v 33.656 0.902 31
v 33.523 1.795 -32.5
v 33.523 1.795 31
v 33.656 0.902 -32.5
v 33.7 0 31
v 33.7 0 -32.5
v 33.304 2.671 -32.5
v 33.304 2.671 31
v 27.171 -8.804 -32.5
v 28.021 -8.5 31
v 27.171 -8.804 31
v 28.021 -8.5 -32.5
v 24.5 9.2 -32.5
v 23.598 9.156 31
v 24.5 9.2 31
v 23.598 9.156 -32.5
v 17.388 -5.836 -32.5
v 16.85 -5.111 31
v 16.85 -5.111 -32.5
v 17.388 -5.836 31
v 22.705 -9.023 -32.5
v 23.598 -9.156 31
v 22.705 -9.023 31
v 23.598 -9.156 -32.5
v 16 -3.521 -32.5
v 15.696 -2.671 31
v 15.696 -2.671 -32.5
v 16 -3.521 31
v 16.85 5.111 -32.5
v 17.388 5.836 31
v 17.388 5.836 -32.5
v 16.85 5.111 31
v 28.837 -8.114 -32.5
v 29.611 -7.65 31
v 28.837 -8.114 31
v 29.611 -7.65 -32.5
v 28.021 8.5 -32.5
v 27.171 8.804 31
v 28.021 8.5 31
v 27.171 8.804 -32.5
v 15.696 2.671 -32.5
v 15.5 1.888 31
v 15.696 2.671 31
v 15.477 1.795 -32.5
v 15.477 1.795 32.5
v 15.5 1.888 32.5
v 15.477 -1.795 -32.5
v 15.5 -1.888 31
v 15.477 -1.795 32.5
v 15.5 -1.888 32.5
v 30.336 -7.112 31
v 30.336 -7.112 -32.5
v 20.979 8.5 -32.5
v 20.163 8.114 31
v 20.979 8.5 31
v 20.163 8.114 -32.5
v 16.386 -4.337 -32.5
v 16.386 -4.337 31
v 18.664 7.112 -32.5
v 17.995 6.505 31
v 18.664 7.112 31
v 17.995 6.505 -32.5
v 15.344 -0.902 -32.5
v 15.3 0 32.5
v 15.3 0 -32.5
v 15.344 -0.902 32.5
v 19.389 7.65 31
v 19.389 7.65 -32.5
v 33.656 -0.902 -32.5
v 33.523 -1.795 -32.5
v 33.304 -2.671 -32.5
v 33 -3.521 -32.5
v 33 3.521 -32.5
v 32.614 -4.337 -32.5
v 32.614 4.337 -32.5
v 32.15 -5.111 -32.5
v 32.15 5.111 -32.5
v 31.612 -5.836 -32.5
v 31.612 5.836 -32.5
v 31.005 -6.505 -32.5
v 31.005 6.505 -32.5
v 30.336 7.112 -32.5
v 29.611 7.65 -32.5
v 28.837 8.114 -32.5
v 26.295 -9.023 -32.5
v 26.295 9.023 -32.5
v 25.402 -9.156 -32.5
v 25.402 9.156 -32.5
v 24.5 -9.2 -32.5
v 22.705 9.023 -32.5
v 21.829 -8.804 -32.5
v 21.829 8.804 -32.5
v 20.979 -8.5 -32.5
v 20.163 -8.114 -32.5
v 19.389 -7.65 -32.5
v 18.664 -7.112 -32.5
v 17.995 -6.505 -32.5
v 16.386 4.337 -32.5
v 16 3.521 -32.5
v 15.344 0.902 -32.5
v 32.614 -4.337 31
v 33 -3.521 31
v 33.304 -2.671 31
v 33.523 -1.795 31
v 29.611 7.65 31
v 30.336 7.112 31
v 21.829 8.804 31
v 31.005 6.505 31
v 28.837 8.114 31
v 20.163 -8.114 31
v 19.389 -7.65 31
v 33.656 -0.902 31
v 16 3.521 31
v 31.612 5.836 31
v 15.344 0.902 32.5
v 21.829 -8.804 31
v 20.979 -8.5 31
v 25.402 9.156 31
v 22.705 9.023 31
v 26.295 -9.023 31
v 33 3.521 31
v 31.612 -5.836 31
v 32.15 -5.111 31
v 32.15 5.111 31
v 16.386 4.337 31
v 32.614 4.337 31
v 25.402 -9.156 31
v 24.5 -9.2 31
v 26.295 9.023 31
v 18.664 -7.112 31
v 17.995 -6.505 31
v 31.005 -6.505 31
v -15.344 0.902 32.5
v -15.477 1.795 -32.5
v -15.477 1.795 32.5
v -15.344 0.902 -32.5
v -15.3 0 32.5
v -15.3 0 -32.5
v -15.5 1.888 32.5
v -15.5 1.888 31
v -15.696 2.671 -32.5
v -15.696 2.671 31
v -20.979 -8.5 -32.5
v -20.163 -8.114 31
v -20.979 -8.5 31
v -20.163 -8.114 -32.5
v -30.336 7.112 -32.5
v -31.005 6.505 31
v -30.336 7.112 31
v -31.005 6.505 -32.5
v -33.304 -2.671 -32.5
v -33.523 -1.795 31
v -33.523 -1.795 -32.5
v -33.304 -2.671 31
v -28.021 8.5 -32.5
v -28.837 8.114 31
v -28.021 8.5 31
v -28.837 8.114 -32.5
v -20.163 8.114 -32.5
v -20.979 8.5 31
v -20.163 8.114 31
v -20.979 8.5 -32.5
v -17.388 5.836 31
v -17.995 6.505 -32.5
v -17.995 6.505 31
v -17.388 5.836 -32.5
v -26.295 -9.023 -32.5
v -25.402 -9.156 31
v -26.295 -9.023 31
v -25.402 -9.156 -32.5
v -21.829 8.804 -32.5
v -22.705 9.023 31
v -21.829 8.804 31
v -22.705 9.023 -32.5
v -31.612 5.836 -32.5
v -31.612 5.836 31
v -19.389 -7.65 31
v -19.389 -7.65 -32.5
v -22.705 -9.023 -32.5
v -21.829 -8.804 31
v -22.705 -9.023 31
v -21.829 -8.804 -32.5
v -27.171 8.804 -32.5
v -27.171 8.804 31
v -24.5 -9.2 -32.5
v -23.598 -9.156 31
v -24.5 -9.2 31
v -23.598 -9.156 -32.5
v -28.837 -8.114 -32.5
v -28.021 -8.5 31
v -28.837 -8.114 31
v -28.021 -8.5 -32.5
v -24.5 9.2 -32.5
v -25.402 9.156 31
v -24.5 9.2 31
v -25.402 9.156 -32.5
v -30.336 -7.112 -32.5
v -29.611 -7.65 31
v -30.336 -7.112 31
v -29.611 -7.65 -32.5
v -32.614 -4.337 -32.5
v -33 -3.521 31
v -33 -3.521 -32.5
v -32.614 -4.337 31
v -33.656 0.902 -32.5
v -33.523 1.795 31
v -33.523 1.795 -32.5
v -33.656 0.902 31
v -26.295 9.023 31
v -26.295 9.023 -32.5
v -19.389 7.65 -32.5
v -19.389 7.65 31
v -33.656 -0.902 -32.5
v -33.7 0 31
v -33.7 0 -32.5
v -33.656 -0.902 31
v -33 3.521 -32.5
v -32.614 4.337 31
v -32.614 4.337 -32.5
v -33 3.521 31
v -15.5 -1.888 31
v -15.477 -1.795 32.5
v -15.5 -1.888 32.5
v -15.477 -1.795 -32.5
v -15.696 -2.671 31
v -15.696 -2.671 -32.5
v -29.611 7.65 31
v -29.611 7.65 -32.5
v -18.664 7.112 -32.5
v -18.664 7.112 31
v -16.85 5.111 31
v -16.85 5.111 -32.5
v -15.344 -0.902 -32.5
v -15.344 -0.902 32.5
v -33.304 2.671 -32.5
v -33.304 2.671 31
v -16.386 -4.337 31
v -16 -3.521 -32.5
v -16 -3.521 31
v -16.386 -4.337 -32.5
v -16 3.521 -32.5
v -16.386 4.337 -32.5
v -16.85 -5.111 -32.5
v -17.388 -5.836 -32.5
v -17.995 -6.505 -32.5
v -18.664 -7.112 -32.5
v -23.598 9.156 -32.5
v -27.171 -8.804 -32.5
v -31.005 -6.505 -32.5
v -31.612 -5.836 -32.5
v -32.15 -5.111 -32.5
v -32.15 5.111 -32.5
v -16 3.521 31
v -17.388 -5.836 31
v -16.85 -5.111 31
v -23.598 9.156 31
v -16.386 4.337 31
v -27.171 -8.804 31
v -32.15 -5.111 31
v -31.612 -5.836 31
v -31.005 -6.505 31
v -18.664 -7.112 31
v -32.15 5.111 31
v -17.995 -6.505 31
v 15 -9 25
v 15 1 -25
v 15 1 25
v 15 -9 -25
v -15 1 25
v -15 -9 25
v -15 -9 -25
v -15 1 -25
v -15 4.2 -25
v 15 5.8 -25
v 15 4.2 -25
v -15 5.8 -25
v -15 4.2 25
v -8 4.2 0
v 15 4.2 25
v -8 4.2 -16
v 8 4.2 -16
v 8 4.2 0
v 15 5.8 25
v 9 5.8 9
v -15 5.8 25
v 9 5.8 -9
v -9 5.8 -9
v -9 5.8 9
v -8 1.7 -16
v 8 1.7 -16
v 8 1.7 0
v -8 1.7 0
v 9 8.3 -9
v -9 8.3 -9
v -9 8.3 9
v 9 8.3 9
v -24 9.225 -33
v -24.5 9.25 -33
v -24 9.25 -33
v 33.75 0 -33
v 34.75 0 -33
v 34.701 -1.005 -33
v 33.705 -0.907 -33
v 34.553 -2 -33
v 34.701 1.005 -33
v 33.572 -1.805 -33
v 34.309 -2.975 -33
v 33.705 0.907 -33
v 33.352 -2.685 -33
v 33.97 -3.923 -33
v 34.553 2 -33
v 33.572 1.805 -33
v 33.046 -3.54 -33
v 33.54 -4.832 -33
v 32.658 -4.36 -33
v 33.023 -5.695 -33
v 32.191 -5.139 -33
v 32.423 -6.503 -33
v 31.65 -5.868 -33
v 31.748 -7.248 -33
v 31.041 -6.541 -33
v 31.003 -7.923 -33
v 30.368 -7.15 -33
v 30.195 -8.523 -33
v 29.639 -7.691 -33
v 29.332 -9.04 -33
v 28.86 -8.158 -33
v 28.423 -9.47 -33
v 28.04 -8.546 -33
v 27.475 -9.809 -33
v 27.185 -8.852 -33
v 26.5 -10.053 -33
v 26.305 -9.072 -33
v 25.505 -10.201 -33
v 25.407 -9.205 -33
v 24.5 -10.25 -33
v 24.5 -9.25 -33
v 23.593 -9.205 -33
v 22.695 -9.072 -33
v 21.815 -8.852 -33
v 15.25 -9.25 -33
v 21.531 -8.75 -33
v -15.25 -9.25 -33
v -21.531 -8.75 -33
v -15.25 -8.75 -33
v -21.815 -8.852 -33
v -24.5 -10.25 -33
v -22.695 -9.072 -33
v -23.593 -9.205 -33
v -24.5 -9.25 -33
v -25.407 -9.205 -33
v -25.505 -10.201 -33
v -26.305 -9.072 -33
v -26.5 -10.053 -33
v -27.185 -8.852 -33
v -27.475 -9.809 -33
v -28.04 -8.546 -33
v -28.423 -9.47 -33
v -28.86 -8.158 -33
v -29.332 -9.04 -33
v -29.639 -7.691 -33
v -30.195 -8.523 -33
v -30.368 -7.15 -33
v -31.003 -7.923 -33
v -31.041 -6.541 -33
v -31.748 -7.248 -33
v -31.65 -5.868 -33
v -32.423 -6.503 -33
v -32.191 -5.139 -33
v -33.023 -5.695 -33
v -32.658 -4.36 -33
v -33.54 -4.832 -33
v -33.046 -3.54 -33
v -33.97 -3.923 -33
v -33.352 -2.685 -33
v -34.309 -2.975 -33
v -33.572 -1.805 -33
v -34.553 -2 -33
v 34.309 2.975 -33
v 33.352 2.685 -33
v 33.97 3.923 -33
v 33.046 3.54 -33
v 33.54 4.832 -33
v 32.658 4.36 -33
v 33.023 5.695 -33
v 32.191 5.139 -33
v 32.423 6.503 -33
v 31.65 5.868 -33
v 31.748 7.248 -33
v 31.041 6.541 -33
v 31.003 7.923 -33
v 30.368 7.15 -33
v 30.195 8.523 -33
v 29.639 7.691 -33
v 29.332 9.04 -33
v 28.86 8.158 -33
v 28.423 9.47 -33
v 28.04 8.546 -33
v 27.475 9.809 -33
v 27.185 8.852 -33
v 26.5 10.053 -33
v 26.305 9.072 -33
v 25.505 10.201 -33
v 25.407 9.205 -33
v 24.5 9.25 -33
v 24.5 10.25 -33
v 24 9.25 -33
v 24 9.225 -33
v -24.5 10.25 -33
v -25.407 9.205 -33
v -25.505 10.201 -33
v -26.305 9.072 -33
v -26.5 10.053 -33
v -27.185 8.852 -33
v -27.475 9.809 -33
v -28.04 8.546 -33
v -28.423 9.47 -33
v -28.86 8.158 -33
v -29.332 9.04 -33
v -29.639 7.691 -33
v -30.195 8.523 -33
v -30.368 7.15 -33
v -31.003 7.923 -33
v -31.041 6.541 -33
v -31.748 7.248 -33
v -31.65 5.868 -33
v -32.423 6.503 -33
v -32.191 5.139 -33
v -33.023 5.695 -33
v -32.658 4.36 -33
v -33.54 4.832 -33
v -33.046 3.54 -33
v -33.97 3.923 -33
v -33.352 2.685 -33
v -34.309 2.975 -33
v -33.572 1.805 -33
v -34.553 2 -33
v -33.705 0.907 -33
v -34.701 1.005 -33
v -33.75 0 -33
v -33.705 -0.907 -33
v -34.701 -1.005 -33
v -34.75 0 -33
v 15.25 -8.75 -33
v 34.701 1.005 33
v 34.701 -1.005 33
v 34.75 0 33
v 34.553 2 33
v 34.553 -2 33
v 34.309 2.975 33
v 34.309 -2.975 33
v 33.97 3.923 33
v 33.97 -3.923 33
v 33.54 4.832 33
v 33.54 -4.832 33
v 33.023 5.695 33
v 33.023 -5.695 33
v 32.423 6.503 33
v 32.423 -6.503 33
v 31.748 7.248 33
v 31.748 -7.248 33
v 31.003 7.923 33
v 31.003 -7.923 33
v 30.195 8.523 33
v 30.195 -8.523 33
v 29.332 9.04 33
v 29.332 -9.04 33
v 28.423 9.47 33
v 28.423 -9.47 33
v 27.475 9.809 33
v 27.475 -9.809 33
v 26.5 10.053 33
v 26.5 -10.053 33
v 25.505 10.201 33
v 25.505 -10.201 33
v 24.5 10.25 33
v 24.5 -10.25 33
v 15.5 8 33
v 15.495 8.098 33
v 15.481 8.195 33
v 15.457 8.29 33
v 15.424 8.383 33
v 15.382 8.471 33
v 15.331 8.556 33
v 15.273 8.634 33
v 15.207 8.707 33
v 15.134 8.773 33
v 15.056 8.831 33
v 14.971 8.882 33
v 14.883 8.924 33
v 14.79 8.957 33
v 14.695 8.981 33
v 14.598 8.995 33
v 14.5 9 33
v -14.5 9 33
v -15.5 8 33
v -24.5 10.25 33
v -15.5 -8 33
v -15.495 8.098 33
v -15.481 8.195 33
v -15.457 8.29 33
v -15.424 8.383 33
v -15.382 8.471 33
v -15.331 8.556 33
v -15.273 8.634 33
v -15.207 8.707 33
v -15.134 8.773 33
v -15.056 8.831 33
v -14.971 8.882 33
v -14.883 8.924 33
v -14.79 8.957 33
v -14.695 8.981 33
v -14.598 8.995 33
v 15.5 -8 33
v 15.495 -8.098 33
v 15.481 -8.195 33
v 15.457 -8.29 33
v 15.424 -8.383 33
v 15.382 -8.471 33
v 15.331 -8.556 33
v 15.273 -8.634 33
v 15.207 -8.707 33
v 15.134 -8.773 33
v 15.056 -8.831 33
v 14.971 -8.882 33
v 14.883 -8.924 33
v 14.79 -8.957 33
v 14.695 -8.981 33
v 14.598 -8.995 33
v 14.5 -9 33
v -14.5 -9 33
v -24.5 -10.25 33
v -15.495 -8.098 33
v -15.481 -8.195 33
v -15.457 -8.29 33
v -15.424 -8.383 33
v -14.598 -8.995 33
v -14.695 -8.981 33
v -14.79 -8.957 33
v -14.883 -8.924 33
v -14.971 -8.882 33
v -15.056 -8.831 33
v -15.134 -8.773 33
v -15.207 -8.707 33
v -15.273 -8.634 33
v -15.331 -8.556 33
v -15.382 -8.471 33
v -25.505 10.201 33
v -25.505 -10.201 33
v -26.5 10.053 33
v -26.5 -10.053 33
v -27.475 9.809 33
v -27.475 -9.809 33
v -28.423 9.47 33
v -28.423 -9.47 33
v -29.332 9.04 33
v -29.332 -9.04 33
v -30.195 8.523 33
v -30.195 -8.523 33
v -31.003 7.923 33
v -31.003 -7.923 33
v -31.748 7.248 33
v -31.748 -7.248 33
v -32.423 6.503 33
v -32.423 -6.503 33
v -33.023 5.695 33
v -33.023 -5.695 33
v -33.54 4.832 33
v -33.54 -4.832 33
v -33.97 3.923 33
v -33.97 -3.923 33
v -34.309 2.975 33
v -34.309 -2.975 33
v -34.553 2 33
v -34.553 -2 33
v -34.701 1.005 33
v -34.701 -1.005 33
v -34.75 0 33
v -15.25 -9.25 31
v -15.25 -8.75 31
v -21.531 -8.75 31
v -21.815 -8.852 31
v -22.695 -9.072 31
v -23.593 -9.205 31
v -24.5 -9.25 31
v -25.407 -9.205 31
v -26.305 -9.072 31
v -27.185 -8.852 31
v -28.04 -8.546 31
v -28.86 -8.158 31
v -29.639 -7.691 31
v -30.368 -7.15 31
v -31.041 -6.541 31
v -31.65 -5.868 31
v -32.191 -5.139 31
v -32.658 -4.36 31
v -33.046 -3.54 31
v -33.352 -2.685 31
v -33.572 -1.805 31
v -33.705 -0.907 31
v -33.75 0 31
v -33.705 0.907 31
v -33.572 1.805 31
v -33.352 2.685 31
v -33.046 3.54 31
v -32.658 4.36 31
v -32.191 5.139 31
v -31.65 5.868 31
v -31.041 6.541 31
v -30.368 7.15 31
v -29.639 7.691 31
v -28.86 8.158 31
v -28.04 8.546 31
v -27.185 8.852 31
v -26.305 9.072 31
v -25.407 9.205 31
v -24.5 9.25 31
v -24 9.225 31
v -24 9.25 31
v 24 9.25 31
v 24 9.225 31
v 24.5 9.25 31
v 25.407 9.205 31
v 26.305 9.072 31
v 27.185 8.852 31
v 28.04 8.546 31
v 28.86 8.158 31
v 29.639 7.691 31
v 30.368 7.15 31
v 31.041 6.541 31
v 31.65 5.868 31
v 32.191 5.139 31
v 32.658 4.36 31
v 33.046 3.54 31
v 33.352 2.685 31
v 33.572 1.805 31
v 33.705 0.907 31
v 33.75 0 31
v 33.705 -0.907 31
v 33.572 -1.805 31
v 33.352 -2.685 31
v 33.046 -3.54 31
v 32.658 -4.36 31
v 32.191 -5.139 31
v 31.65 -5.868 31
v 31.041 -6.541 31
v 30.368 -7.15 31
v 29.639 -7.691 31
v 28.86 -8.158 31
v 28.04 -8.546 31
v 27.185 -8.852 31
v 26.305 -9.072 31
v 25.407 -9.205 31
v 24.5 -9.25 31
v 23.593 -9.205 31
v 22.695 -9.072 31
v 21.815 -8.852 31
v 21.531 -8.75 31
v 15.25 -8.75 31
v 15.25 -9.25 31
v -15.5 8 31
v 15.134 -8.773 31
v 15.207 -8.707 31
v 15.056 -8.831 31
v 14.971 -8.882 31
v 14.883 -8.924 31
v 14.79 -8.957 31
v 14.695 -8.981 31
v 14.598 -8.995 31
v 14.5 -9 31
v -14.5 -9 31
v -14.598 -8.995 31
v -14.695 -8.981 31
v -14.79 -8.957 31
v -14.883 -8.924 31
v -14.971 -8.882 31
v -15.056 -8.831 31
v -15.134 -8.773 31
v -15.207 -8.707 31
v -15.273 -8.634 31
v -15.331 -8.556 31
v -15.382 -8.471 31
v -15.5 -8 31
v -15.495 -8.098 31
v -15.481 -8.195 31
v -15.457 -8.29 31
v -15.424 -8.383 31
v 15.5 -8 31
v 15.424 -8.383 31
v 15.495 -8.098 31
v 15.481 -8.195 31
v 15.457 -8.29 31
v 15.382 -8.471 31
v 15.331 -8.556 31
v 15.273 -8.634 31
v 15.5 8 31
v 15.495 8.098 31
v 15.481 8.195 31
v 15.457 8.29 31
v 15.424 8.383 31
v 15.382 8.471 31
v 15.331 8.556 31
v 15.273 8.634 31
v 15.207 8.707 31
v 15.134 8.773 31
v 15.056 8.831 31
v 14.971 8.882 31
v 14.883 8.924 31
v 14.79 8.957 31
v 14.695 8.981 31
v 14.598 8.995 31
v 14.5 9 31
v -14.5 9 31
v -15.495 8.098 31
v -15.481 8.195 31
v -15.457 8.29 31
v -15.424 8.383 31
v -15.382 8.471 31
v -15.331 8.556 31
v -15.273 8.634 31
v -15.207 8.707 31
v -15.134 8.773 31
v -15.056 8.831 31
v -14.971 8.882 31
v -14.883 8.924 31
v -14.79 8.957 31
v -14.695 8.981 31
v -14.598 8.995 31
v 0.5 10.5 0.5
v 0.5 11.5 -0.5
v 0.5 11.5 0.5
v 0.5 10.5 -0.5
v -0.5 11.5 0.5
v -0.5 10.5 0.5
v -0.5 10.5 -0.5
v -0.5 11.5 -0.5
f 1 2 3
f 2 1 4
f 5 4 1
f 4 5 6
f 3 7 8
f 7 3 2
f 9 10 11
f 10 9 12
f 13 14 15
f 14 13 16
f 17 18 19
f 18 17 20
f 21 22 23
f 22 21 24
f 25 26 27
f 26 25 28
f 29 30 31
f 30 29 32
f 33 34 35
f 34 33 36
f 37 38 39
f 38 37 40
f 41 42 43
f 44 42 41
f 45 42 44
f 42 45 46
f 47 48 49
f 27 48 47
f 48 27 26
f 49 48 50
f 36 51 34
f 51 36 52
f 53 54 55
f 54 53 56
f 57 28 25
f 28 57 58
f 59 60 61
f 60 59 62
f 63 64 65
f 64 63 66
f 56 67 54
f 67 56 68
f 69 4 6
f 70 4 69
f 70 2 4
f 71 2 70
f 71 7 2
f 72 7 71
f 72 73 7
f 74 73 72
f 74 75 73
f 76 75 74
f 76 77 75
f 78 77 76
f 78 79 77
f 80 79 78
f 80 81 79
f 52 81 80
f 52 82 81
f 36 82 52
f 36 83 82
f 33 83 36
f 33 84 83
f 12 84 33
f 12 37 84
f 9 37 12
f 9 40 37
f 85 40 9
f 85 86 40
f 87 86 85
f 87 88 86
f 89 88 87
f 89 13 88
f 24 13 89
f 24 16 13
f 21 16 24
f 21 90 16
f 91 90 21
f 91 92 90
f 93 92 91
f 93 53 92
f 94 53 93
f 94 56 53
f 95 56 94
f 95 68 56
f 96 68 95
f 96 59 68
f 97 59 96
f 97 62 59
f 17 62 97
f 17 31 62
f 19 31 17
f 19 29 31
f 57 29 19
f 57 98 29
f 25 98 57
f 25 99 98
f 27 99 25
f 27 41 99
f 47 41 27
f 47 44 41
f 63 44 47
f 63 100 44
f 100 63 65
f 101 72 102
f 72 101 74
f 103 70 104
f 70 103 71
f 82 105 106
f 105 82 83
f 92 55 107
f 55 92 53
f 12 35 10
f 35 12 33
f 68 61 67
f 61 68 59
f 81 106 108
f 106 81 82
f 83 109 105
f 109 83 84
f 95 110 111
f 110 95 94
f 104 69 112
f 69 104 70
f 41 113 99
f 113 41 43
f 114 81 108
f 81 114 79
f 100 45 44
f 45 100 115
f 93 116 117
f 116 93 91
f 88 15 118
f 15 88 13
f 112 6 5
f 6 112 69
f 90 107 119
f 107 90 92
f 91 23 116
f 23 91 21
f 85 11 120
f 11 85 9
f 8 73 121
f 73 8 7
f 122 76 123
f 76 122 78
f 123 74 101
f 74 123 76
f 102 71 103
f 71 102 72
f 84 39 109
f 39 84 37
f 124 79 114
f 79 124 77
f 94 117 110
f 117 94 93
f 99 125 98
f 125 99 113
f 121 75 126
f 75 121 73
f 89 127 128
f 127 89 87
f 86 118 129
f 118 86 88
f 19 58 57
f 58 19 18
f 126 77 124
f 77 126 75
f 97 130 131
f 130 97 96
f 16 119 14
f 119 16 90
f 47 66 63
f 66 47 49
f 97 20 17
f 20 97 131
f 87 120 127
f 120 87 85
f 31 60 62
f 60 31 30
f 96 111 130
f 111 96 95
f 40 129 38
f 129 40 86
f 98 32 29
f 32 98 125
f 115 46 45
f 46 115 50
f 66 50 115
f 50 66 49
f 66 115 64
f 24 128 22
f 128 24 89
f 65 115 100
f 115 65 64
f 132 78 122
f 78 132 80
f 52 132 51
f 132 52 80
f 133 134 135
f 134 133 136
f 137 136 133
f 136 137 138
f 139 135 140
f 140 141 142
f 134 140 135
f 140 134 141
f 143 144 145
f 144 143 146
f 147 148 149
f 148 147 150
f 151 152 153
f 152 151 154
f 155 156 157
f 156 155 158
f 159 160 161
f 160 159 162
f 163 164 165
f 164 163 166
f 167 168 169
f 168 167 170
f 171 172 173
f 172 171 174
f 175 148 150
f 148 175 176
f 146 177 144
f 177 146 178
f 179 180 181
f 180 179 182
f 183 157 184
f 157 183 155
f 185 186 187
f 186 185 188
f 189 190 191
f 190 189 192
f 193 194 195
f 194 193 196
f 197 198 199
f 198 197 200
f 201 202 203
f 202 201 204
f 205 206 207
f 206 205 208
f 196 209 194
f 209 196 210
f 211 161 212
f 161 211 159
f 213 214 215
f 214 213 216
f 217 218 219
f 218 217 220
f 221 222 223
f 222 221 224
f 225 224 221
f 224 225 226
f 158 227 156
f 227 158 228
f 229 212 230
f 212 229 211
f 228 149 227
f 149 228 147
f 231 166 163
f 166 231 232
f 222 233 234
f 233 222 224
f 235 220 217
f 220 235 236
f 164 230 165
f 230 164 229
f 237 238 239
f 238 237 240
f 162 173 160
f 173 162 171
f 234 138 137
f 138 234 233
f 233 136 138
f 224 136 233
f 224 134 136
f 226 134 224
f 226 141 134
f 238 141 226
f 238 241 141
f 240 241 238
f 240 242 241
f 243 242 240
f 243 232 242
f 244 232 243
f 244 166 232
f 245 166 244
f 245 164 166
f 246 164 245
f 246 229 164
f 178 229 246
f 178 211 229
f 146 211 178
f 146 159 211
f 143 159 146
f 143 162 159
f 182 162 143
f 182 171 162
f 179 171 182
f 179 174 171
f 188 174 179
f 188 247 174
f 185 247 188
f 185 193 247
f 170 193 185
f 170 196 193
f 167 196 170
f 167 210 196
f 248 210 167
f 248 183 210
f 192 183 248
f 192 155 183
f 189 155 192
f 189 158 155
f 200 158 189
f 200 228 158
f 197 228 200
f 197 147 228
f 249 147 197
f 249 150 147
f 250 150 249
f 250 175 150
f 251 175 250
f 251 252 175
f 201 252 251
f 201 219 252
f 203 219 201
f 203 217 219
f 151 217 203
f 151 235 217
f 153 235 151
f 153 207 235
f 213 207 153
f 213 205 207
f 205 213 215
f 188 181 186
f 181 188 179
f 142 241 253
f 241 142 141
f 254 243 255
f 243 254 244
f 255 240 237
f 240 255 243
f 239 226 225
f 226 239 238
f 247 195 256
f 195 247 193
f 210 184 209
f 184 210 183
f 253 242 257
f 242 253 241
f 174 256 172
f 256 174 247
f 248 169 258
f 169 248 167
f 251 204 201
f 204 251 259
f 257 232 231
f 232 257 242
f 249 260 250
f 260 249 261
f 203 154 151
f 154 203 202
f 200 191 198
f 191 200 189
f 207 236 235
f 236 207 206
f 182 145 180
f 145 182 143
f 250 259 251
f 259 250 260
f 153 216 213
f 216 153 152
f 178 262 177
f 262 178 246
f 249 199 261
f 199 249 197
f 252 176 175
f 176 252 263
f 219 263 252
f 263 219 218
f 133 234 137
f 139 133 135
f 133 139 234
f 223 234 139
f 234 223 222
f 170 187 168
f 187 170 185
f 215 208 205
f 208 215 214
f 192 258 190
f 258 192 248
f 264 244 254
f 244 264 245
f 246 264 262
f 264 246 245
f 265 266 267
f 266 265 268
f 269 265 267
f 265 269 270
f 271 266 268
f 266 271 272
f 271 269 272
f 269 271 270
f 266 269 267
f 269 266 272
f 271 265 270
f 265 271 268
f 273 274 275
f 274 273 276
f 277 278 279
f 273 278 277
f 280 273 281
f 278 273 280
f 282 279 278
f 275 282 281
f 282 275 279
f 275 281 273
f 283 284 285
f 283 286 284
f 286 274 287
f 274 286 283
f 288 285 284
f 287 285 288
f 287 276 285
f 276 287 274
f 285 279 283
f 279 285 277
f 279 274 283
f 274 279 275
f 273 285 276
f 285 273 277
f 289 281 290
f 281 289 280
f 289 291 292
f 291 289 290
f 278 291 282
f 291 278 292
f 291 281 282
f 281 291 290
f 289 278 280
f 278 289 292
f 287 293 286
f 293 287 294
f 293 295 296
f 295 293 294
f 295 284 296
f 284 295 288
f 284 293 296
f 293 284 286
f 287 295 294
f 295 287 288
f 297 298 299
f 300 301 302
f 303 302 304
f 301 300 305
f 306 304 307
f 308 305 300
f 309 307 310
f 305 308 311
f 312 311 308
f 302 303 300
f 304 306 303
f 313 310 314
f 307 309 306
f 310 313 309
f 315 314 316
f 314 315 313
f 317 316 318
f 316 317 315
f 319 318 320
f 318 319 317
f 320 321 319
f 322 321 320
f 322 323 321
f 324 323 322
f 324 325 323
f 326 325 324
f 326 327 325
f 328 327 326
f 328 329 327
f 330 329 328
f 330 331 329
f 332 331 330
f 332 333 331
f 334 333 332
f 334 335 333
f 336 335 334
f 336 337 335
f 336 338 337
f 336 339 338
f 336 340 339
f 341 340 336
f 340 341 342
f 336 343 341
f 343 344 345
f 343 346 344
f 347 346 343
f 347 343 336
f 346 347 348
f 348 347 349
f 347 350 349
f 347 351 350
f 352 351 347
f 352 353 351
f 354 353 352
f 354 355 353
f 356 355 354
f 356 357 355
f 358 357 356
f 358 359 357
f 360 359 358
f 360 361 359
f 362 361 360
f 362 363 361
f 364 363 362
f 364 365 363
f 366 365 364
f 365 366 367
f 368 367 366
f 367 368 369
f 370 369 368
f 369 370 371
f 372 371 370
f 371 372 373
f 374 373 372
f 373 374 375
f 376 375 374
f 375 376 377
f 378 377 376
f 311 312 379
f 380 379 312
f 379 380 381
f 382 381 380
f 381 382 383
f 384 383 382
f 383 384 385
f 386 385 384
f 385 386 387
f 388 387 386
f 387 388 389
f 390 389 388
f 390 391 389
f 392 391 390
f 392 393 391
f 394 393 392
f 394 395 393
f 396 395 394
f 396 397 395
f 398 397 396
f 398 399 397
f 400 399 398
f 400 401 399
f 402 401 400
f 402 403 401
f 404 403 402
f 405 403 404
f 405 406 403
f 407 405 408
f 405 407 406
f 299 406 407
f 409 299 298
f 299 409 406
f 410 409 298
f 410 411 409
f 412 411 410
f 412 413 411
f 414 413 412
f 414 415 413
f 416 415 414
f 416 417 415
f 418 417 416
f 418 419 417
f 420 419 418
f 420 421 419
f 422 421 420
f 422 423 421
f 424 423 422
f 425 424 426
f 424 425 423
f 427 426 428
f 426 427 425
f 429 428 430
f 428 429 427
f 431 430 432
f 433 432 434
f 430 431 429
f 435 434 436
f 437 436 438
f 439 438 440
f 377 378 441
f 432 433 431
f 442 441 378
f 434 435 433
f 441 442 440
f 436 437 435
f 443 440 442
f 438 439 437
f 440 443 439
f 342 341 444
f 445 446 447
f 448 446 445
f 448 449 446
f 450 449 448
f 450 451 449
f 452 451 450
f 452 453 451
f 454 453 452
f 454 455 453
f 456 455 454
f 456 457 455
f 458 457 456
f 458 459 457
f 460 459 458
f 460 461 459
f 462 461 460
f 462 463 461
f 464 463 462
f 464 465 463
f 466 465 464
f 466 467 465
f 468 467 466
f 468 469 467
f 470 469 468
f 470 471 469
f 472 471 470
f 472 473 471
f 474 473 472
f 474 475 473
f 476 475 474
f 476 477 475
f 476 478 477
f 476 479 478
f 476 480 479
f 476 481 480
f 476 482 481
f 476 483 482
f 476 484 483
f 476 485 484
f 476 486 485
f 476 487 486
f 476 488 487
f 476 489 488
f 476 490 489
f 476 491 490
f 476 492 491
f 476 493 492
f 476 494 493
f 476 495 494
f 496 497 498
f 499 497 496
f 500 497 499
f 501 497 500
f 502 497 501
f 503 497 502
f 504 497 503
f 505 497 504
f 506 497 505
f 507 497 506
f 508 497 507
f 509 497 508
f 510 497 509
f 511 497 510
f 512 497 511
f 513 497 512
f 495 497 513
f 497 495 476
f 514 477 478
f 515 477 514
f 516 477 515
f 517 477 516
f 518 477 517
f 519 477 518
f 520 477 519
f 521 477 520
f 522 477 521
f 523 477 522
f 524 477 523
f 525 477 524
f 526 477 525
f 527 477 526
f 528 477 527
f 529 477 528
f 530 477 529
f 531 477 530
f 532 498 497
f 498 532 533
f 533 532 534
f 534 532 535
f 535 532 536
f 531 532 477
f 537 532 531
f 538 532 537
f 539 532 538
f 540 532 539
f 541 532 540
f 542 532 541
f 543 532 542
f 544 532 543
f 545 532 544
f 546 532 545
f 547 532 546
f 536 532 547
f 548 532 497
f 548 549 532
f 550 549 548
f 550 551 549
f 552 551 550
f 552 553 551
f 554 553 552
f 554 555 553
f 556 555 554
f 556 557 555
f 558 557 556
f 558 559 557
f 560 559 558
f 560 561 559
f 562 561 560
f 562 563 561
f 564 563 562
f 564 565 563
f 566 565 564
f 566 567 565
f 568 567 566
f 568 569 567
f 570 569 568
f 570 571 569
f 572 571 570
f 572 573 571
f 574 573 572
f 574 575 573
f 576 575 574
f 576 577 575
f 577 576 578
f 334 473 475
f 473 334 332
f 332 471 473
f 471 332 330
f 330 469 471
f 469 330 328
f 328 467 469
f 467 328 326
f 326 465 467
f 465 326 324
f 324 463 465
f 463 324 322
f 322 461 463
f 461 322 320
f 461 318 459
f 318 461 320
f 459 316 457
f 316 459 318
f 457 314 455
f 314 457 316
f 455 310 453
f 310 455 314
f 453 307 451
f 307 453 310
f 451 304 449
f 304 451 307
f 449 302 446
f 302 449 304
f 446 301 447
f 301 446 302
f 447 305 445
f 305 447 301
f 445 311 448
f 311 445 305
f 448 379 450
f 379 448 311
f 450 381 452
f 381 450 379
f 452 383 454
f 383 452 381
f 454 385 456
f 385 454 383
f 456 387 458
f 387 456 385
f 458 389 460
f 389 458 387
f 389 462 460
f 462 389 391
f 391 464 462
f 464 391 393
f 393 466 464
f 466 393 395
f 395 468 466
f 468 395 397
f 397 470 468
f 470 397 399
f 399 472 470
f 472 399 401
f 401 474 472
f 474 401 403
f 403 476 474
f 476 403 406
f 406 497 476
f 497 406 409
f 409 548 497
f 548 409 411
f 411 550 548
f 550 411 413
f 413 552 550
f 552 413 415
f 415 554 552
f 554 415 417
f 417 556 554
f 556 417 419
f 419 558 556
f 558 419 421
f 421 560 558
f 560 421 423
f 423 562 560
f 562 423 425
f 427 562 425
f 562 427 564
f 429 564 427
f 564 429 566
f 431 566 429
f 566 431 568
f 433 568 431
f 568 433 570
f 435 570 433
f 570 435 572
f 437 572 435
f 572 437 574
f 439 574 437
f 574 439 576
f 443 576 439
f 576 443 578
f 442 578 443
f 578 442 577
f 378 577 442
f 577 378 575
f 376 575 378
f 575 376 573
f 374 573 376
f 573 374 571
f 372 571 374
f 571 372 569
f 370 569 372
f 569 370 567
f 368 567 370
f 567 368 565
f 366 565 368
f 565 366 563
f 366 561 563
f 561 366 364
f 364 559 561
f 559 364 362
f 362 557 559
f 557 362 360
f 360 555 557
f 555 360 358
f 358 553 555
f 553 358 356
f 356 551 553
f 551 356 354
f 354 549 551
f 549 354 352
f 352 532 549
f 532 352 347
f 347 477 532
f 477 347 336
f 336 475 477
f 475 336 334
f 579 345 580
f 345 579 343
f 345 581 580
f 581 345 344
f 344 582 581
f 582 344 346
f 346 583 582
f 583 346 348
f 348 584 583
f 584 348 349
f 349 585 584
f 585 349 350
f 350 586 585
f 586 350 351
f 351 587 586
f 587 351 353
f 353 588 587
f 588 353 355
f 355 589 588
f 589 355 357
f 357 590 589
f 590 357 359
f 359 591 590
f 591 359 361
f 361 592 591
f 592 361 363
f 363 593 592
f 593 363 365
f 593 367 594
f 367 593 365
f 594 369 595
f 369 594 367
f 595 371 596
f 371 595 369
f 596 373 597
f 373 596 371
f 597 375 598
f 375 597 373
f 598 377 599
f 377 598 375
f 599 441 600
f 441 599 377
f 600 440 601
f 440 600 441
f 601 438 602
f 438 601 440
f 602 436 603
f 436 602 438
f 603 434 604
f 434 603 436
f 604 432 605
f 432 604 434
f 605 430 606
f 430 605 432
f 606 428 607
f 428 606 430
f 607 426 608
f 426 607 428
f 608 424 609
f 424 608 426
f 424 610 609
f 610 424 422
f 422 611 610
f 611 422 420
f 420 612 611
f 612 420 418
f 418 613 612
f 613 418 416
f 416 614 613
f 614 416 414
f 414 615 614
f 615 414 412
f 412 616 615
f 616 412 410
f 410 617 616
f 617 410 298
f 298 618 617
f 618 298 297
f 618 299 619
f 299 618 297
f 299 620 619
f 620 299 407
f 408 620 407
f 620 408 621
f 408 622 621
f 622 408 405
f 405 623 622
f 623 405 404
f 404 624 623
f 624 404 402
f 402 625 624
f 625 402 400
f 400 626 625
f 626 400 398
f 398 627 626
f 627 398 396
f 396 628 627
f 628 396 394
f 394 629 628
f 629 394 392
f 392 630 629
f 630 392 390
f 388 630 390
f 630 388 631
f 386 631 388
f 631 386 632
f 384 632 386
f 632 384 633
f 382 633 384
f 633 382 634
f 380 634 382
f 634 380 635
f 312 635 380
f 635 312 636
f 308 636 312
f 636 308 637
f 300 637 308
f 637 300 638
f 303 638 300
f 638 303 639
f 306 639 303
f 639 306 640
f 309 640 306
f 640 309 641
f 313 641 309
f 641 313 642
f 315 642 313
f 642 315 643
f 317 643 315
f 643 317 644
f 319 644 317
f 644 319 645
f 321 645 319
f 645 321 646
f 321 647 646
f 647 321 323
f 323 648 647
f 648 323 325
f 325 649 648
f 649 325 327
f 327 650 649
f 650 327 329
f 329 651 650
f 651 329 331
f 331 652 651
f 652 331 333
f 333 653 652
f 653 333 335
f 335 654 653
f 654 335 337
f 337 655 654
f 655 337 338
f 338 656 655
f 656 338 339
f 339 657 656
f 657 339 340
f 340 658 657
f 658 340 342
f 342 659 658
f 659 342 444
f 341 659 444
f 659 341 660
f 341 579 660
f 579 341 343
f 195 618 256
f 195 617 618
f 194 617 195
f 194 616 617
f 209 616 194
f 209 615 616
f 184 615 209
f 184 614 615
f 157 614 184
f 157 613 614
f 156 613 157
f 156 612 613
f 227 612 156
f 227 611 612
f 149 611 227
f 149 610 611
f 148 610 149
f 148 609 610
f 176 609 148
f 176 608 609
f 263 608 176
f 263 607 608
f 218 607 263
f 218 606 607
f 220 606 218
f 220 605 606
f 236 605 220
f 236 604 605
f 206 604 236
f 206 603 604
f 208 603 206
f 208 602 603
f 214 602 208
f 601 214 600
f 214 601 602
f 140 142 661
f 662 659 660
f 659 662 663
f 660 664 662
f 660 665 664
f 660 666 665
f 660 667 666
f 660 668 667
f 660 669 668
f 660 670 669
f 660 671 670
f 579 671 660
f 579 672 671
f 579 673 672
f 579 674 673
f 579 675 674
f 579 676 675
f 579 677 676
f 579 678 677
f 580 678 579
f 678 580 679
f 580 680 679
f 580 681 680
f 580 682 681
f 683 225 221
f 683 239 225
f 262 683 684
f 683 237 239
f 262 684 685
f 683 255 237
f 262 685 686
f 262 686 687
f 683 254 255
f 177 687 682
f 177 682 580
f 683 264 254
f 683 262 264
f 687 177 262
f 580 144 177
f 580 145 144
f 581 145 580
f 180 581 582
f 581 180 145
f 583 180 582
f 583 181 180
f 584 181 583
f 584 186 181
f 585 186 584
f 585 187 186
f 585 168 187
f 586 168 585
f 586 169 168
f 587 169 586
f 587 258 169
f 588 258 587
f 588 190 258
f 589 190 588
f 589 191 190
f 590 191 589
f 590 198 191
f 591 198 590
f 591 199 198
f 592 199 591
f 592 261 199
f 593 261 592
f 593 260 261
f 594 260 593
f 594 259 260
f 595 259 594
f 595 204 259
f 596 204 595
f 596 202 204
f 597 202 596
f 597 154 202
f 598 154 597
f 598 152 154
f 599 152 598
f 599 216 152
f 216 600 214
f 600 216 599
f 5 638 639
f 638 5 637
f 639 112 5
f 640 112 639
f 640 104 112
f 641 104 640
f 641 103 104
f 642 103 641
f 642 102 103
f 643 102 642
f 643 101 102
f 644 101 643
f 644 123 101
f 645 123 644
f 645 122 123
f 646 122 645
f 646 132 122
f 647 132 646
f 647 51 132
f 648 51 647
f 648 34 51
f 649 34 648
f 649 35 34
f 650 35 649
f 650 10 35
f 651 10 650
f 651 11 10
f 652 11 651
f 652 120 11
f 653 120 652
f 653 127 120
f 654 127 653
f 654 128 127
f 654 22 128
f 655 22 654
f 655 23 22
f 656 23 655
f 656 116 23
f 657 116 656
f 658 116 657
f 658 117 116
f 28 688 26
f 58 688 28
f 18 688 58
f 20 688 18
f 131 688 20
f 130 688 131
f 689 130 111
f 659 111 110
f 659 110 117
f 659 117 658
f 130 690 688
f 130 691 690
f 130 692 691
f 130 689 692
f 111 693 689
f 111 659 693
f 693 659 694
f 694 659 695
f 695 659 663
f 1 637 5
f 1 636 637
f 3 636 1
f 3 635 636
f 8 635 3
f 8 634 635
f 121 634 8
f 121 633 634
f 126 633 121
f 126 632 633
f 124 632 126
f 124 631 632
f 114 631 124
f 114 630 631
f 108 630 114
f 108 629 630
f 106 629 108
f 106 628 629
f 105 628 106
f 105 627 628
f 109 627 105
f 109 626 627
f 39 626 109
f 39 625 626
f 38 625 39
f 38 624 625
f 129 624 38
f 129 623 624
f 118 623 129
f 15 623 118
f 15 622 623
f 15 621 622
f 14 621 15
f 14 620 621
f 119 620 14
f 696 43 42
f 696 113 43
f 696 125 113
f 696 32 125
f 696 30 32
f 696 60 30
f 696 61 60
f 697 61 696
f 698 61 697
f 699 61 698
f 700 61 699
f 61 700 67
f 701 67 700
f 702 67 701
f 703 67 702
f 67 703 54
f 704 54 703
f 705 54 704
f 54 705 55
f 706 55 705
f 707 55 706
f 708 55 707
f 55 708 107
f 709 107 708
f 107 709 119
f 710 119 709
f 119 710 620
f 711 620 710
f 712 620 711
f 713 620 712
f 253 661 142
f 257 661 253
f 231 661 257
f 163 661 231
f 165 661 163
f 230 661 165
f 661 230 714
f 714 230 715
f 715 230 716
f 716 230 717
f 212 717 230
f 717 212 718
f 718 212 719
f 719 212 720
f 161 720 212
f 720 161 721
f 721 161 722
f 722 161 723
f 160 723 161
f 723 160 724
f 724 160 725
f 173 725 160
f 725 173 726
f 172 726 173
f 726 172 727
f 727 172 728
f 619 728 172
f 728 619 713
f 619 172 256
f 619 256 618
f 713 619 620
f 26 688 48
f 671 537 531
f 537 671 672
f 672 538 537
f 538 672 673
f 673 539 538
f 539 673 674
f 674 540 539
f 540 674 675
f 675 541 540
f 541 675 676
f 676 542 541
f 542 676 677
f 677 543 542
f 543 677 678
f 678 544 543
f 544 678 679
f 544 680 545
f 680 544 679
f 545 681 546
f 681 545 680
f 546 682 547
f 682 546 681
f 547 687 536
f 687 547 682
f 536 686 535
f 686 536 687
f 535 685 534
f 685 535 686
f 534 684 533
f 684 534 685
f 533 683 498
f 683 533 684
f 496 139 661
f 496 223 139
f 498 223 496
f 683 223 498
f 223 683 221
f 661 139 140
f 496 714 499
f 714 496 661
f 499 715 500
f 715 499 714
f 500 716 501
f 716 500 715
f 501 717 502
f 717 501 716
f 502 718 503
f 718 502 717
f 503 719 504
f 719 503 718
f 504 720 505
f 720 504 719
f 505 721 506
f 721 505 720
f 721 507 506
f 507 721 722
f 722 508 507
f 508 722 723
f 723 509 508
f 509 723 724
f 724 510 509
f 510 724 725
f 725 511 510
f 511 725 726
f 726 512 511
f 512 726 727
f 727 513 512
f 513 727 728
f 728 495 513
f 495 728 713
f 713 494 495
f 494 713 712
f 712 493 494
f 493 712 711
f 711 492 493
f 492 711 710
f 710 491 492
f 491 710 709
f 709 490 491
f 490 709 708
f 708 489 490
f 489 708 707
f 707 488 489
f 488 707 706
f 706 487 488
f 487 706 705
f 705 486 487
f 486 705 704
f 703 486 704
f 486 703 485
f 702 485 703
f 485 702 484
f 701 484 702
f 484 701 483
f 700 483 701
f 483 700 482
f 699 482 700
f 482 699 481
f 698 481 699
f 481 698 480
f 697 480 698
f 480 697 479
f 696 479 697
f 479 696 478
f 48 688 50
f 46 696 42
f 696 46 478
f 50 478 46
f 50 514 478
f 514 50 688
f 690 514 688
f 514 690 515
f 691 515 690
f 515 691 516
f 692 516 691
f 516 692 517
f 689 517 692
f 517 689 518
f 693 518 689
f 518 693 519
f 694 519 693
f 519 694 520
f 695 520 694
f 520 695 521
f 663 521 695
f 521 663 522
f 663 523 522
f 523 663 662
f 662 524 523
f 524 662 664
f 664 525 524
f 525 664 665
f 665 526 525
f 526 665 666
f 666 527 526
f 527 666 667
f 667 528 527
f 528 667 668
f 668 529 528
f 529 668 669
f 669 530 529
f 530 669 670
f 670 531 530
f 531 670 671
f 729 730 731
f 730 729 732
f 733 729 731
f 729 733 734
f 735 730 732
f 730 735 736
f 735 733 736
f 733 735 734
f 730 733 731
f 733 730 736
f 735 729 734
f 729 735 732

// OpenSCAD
// file: library.scad
// Аккумулятор 18650

module akk18650() {
  cylinder(d=18.4, h=65, center=true);
  
}
// main file
include <library.scad>


// Под магнит 50х30х10 (40кг)

$fn = 64;

if(true) {

  translate([ 24.5, 0, 0]) akk18650();
  translate([-24.5, 0, 0]) akk18650();
  
  // Магниты
  /*translate([ 33, -5, 0]) cube([8,8,55], center=true);*/
  /*translate([-33, -5, 0]) cube([8,8,55], center=true);*/

  /*translate([-34, -7, 38/2+0.5]) cube([12,6,38], center=true);
  translate([-34, -7,-38/2-0.5]) cube([12,6,38], center=true);
  
  translate([ 34, -7, 38/2+0.5]) cube([12,6,38], center=true);
  translate([ 34, -7,-38/2-0.5]) cube([12,6,38], center=true);*/

  translate([0, -4, 0]) cube([30,10,50], center=true);

}


// PCB

GPS=18;

if(true) {
  translate([0,5,0]) rotate([90,90,0]){
    color("Green") 
      translate([0, 0, 0])
        cube([50,30,1.6], center=true);
      
    color("Black") {
      translate([0,-8,1.6/2]) cube([16,16,2.5]);
    }
    color("Gray") {
      translate([-GPS/2,-GPS/2,-1.6/2-2.5]) cube([GPS,GPS,2.5]);
    }
  }
}


// Корпус

L = 66;

module hand() {
  rotate([-90, 0, 0]) {
    difference() {
      cylinder(d1=6, d2=5, h=3.0);
      translate([ 0, 0, 0.1]) cylinder(d=1.5, h=33);
    }
  }
}

module shape() {
  hull() {
    translate([-24.5,0]) circle(d=18.5+2);
    translate([ 24.5,0]) circle(d=18.5+2);
    /*translate([-20,7]) circle(d=9);
    translate([ 20,7]) circle(d=9);*/
  }
}

color("red")
difference() {
  
union(){

linear_extrude(height = L, center=true) {
  union() {
    difference() {
      shape();
      
      // Под аккумуляторы
      translate([-24.5,0]) circle(d=18.5);
      translate([ 24.5,0]) circle(d=18.5);
      
      // Полость для платы и магнита.
      translate([ 0, 0.25]) square(size=[48, 18], center=true);
      
      // Формы на дне
      translate([ 0, -7]) square(size=[30.5, 4.5], center=true);
      
      // Монтажное окно
      /*translate([ 0, 10]) square(size=[36, 5], center=true);
      translate([ 19.5, 11.5]) square(size=[1,2], center=true);
      translate([-19.5, 11.5]) square(size=[1,2], center=true);*/
    }
    /*translate([-16,-9]) square(size=[6, 1], center=true);*/
    /*translate([ 13.2,-9]) square(size=[1, 2], center=true);*/
    
  }
}


// Боковые стенки
  /*translate([0, 0,-L/2-1]) linear_extrude(height = 2, center=true) difference() {
    shape();
  }*/

  translate([0, 0, L/2-1]) linear_extrude(height = 2, center=true) difference() {
    shape();
    hull() {
      translate([-31/2+1,-18/2+1]) circle(r=1);
      translate([ 31/2-1,-18/2+1]) circle(r=1);
      translate([-31/2+1, 18/2-1]) circle(r=1);
      translate([ 31/2-1, 18/2-1]) circle(r=1);
    }
  }

  /*translate([0, 0,-L/2-1]) difference() {
    linear_extrude(height = 2, center=true) difference() {
      shape();
      translate([-19.5, 11.5]) square(size=[1,2], center=true);
      translate([ 19.5, 11.5]) square(size=[1,2], center=true);
    }
    translate([ 0, 11.5,-1]) cube(size=[40,2,2], center=true);
  }

  mirror([0,0,1]) translate([0, 0,-L/2-1]) difference() {
    linear_extrude(height = 2, center=true) difference() {
      shape();
      translate([-19.5, 11.5]) square(size=[1,2], center=true);
      translate([ 19.5, 11.5]) square(size=[1,2], center=true);
    }
    translate([ 0, 11.5,-1]) cube(size=[40,2,2], center=true);
  }*/



  /*translate([-18.5/2, -9.6, -L/2+5]) hand();
  translate([ 18.5/2, -9.6, -L/2+5]) hand();
  translate([-18.5/2, -9.6,  L/2-5]) hand();
  translate([ 18.5/2, -9.6,  L/2-5]) hand();*/

}
  // Монтажное окно
  /*%translate([ 0, 0, -L/2]) cube([36, 18.5, 5], center=true);*/

/*translate([50,0,50]) cube([100,100,100], center=true);*/
}

// Ориентир
translate([0,11,0]) cube([1,1,1], center=true);

// Крышка
if(false){
  
color([1,1,0.5])
translate([0, 12.1, 0]) {
  difference() {
    cube([40, 3, L+4], center=true);
    
    // Выборка под GPS-антенну 35х35
    translate([0, -1, 0]) cube([35, 1.75, L-1], center=true);
    
    // Выборка под уплотнительную резинку
    translate([-18.5,-0.51, 0]) cube([1.5, 2.0, L+2], center=true);
    translate([ 18.5,-0.51, 0]) cube([1.5, 2.0, L+2], center=true);
    
    translate([ 0,-0.51,-L/2-0.5]) cube([38, 2.0, 1.5], center=true);
    translate([ 0,-0.51, L/2+0.5]) cube([38, 2.0, 1.5], center=true);

    /*translate([50,0,50]) cube([100,100,100], center=true);*/

  }
}
}
